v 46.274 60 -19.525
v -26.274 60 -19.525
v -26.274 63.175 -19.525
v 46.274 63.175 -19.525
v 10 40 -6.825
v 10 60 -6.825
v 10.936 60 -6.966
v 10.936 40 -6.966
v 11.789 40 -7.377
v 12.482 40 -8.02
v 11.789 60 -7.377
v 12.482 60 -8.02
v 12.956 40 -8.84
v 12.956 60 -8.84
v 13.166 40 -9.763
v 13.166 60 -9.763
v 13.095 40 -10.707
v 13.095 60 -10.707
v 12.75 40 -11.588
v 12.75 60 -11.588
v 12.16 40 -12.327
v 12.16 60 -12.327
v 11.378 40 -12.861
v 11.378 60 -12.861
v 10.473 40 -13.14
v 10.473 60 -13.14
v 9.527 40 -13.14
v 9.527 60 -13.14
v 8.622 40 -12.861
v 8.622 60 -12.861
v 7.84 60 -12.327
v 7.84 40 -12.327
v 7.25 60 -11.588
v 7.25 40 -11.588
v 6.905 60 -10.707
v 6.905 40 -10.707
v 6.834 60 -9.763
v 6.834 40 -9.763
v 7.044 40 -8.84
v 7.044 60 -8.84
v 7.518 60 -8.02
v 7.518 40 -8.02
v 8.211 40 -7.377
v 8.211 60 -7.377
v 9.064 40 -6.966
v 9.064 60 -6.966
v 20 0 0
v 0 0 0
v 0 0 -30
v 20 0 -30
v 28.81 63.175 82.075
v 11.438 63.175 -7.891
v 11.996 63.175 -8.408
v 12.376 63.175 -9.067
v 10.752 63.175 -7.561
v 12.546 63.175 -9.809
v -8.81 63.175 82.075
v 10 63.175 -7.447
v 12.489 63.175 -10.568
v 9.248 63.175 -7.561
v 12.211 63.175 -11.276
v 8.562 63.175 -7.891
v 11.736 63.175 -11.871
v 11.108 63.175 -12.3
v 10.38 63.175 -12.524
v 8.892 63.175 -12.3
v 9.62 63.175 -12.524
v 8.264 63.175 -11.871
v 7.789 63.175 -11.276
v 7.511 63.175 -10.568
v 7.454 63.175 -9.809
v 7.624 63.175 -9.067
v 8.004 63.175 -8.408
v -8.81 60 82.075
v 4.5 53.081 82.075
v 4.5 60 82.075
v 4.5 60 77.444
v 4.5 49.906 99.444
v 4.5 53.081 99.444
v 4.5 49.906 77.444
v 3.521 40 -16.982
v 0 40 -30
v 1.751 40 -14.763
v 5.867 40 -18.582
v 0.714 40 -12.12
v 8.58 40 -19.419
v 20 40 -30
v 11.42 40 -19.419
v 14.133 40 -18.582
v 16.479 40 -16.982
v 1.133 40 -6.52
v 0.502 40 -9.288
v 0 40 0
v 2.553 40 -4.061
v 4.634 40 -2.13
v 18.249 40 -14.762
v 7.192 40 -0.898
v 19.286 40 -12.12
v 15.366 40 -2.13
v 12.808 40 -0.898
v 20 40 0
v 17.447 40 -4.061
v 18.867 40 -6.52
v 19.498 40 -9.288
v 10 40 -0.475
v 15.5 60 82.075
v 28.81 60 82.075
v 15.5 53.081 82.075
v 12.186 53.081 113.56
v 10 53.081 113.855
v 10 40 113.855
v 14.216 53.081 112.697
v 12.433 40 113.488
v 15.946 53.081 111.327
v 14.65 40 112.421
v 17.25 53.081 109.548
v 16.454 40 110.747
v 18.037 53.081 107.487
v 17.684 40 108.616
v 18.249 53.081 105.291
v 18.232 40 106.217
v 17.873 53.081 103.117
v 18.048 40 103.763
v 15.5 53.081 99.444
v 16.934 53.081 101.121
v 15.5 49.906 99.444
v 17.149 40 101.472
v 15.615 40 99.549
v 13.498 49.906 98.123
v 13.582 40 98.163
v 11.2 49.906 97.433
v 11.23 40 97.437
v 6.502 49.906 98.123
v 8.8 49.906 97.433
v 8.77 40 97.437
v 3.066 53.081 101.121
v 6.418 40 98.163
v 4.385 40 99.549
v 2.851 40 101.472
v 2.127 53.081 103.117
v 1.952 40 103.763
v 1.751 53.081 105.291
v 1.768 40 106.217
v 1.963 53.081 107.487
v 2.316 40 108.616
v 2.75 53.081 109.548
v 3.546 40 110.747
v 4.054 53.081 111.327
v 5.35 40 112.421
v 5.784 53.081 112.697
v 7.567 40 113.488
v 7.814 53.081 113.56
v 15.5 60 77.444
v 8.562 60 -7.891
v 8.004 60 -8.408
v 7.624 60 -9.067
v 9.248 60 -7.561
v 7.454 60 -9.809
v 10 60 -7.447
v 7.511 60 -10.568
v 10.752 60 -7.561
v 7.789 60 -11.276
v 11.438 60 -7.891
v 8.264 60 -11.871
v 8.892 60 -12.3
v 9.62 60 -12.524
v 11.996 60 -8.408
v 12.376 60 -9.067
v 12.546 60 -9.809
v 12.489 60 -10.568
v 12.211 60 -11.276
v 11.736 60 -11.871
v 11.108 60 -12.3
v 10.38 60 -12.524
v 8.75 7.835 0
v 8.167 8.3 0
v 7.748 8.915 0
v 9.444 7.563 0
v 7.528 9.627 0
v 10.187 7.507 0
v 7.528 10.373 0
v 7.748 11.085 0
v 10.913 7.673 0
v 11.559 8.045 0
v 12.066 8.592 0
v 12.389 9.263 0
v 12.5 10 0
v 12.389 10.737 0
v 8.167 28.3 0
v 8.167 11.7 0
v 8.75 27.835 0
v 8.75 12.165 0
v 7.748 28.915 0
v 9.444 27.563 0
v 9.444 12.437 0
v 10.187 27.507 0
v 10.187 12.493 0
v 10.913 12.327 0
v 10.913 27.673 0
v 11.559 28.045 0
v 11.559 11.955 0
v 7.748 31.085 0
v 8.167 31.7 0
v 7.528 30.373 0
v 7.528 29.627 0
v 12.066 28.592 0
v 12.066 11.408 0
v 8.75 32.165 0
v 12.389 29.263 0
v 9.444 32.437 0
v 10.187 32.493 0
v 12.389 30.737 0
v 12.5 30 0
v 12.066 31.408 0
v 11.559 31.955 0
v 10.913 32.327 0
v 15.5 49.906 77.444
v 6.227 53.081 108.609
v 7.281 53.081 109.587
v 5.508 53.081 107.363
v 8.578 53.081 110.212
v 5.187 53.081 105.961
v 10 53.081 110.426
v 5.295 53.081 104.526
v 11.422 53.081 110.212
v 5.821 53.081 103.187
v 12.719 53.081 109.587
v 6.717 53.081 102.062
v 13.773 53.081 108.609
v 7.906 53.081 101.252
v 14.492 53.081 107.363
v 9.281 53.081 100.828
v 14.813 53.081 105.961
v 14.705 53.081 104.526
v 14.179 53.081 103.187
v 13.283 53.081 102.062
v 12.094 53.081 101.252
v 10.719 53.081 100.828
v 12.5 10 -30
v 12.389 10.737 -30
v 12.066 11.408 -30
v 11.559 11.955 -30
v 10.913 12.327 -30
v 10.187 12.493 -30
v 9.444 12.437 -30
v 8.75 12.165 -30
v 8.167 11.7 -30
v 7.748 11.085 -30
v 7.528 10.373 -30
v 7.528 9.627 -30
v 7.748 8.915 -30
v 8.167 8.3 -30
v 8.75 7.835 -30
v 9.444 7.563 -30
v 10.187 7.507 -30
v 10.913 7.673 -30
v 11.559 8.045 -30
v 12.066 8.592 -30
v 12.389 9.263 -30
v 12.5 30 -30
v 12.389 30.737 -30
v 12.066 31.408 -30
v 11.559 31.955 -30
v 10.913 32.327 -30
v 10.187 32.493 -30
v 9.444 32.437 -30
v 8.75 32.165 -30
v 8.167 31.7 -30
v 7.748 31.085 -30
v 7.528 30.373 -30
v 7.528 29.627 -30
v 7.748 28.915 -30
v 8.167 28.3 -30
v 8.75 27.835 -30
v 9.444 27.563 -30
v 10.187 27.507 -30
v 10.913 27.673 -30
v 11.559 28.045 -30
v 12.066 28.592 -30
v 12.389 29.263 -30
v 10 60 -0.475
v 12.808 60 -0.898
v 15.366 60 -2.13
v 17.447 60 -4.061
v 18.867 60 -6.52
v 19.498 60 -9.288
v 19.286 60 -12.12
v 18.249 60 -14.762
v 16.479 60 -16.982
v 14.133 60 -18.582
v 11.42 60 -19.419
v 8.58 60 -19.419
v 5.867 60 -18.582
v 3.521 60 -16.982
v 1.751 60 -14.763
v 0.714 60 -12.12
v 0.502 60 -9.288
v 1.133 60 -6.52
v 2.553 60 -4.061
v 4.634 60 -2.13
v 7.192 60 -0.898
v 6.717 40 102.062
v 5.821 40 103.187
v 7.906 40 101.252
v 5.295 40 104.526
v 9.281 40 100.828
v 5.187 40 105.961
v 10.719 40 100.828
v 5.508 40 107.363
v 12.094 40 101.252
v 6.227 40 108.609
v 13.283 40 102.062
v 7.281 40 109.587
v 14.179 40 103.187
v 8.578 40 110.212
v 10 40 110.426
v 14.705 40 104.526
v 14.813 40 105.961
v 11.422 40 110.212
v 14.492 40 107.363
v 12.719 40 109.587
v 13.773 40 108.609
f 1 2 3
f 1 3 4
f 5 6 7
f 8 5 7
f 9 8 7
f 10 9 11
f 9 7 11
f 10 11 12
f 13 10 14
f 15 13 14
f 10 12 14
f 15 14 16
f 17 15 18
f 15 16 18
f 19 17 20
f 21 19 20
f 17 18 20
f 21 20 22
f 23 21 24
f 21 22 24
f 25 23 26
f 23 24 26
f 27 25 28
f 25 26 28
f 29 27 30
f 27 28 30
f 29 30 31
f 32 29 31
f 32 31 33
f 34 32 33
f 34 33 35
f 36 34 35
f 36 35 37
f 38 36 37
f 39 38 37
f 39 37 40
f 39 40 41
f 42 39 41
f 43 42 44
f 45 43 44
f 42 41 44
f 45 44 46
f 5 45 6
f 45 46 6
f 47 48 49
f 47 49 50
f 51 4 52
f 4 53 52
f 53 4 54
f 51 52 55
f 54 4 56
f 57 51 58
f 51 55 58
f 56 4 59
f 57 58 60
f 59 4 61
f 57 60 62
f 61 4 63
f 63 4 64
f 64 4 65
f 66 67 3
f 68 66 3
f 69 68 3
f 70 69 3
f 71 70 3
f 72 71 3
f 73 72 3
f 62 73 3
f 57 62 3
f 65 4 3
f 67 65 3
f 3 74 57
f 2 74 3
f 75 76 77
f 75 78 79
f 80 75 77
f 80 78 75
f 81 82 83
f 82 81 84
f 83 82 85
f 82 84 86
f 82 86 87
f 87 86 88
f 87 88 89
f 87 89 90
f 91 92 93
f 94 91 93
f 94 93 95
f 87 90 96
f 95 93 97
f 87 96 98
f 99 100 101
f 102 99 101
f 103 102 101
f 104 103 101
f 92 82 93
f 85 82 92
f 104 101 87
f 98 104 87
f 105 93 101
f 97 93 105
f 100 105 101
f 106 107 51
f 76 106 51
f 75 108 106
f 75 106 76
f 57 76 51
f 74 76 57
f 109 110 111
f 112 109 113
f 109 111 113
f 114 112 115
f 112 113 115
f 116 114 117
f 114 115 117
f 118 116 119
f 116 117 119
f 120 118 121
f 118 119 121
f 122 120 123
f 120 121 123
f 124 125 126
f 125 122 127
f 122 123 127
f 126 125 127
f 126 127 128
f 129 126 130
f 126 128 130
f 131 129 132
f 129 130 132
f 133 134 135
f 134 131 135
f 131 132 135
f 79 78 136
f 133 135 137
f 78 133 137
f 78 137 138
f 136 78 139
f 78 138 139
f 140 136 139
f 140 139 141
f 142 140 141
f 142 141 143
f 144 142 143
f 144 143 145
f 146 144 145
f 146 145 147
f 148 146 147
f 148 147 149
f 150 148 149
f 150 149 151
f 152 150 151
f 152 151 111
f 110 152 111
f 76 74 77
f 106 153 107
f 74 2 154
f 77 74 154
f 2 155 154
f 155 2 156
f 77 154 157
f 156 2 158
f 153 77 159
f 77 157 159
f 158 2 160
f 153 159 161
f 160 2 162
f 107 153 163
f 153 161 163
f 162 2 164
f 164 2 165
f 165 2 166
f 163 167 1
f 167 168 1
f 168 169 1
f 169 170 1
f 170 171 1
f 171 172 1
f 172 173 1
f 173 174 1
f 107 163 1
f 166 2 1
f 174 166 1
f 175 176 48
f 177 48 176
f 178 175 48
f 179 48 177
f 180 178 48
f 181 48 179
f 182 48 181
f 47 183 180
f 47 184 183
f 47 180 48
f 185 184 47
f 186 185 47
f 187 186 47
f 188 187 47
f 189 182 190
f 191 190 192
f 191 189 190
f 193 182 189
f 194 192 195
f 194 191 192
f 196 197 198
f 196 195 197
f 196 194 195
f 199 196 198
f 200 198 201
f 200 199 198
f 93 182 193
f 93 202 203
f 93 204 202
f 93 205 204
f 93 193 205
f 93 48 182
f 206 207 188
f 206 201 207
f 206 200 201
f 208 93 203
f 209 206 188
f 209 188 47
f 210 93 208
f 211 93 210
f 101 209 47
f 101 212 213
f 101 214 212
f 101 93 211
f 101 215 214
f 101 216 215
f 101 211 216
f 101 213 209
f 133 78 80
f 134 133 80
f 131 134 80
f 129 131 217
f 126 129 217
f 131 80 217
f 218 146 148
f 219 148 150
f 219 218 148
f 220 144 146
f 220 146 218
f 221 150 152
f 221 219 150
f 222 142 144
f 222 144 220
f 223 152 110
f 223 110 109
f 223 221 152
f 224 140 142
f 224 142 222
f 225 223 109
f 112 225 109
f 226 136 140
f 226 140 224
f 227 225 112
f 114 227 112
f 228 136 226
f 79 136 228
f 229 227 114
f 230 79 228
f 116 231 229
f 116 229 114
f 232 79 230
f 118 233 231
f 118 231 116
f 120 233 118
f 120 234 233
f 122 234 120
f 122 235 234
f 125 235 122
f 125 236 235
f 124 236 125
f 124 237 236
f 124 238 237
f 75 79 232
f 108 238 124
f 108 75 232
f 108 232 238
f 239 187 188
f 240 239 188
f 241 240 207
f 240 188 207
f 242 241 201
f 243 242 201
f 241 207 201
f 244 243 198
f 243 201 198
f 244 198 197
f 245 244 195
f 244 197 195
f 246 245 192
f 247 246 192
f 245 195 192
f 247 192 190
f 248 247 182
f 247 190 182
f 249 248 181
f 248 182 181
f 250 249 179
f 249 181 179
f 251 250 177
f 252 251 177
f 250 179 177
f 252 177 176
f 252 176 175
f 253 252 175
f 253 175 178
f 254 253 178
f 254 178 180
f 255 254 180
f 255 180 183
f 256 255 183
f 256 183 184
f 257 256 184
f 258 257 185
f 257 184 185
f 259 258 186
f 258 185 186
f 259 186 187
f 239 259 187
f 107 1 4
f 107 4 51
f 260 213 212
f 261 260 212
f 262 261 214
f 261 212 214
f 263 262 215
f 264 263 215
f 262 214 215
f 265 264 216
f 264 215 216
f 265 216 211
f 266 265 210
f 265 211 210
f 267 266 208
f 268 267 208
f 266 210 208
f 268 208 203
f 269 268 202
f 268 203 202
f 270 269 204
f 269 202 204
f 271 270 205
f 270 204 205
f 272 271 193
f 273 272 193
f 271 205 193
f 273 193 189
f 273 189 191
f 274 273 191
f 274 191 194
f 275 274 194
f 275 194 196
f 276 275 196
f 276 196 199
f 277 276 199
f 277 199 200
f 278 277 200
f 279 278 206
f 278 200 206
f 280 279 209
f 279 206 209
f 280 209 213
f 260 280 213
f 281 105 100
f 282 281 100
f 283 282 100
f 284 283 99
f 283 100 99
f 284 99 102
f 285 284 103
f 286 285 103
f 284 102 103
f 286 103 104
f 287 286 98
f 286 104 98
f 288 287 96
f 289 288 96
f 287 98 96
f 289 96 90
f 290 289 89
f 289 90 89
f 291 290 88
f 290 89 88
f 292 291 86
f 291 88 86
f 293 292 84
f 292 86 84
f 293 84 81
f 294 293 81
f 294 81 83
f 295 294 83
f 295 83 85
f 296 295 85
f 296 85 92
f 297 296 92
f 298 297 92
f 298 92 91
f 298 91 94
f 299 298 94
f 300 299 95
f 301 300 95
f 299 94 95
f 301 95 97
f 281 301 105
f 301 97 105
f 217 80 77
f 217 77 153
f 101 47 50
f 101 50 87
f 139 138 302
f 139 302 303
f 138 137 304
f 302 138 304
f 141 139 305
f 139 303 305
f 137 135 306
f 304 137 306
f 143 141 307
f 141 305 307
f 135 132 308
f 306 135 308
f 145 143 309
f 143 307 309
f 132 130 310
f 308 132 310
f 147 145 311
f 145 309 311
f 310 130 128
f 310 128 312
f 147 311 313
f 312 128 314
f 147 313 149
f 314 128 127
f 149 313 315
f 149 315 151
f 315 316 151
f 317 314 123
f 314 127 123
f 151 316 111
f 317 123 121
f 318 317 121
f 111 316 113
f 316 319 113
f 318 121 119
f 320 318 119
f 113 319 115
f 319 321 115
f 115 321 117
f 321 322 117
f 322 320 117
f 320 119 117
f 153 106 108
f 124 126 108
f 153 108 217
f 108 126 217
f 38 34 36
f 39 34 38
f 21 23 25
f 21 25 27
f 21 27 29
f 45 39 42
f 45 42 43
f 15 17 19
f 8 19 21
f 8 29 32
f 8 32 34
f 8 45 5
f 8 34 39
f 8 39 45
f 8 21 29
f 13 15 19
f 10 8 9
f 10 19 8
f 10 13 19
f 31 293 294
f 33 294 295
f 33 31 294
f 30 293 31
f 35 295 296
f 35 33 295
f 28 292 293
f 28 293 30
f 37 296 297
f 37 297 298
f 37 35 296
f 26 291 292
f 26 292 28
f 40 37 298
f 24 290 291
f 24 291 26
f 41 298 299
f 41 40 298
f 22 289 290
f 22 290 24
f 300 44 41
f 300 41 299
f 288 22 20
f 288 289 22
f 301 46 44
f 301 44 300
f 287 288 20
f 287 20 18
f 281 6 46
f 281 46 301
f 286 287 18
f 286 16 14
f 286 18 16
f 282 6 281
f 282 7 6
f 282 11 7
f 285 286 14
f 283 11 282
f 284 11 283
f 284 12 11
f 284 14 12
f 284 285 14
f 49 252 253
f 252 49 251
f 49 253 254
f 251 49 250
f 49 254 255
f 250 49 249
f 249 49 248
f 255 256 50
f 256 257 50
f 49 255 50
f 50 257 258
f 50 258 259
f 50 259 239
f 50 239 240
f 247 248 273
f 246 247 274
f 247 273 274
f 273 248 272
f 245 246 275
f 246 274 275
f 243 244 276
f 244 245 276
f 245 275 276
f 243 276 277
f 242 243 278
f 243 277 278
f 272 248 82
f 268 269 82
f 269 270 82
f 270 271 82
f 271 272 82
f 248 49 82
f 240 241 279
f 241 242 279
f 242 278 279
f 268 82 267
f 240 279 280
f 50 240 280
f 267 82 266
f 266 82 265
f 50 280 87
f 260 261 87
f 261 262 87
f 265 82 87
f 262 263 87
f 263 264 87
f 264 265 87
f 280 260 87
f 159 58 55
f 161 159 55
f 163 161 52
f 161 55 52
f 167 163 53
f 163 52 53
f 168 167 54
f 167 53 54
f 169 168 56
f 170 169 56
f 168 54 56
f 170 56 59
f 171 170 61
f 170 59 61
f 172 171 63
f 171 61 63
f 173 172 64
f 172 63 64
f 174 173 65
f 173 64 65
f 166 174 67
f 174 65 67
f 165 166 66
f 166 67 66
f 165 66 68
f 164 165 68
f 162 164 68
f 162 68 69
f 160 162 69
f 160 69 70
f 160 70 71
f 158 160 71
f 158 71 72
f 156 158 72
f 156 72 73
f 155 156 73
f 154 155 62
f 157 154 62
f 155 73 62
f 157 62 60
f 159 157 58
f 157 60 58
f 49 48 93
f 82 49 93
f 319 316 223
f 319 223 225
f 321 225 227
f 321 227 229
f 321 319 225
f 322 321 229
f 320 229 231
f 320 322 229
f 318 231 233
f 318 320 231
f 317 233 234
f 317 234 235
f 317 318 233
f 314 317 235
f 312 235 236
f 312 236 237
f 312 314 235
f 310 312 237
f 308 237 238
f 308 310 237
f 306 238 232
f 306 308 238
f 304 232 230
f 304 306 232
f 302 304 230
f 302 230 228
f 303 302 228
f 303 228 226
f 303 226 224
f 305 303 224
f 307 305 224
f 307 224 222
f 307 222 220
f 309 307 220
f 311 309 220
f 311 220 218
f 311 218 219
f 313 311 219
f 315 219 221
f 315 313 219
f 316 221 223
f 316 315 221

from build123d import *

# Parameters (mm, degrees)
SKETCH1_W           = 20
SKETCH1_H           = 40
SKETCH1_R           = 2.5
BOSS_EXTRUDE1_DEPTH = 30
SKETCH3_R           = 9.525
BOSS_EXTRUDE2_DEPTH = 20
SKETCH5_R           = 3.175
CUT_EXTRUDE1_DEPTH  = 20
SKETCH4_R           = 4.826
BOSS_EXTRUDE3_DEPTH = 3.175
SKETCH7_R           = 8.255
SKETCH7_R_2         = 4.826
BOSS_EXTRUDE5_DEPTH = 13.081
SKETCH9_W           = 11
SKETCH9_H           = 22
BOSS_EXTRUDE6_DEPTH = 3.175
SKETCH10_W          = 11
SKETCH10_H          = 4.630893518
BOSS_EXTRUDE7_DEPTH = 6.919
SKETCH13_R          = 2.5527
CUT_EXTRUDE5_DEPTH  = 3.175


with BuildPart() as part:
    # Sketch1 → Boss-Extrude1 (new body)
    with BuildSketch(Plane.XY):
        with Locations((10, 20)):
            Rectangle(SKETCH1_W, SKETCH1_H)
        with Locations((10, 30)):
            Circle(SKETCH1_R, mode=Mode.SUBTRACT)
        with Locations((10, 10)):
            Circle(SKETCH1_R, mode=Mode.SUBTRACT)
    extrude(amount=-BOSS_EXTRUDE1_DEPTH)

    # Sketch3 → Boss-Extrude2 (add)
    with BuildSketch(Plane(origin=(0, 40, 0), x_dir=(1, 0, 0), z_dir=(0, 1, 0))):
        with Locations(Location((10, 10, 0), (0, 0, 270))):
            Circle(SKETCH3_R)
    extrude(amount=BOSS_EXTRUDE2_DEPTH)

    # Sketch5 → Cut-Extrude1 (cut)
    with BuildSketch(Plane(origin=(0, 60, 0), x_dir=(1, 0, 0), z_dir=(0, 1, 0))):
        with Locations(Location((10, 10, 0), (0, 0, 270))):
            Circle(SKETCH5_R)
    extrude(amount=-CUT_EXTRUDE1_DEPTH, mode=Mode.SUBTRACT)


with BuildPart() as body_2:
    # Sketch4 → Boss-Extrude3 (new body)
    # profile 1 of 2: a face of its own
    with BuildSketch(Plane(origin=(0, 60, 0), x_dir=(1, 0, 0), z_dir=(0, 1, 0))):
        Polygon((46.273751225, 19.525), (28.810402961, -82.075), (-8.810402961, -82.075), (-26.273751225, 19.525), align=None)
        with Locations((10, -73.185)):
            Circle(SKETCH4_R, mode=Mode.SUBTRACT)
    # profile 2 of 2: a face of its own
    with BuildSketch(Plane(origin=(0, 60, 0), x_dir=(1, 0, 0), z_dir=(0, 1, 0))):
        with Locations((10, -73.185)):
            Circle(SKETCH4_R)
    extrude(amount=BOSS_EXTRUDE3_DEPTH)


with BuildPart() as body_3:
    # Sketch7 → Boss-Extrude5 (new body)
    with BuildSketch(Plane(origin=(0, 40, 0), x_dir=(1, 0, 0), z_dir=(0, 1, 0))):
        with Locations(Location((10, -105.6, 0), (0, 0, 270))):
            Circle(SKETCH7_R)
        with Locations(Location((10, -105.6, 0), (0, 0, 270))):
            Circle(SKETCH7_R_2, mode=Mode.SUBTRACT)
    extrude(amount=BOSS_EXTRUDE5_DEPTH)

    # Sketch9 → Boss-Extrude6 (add)
    with BuildSketch(Plane(origin=(0, 53.081, 0), x_dir=(1, 0, 0), z_dir=(0, 1, 0))):
        with Locations((10, -88.444106482)):
            Rectangle(SKETCH9_W, SKETCH9_H)
    extrude(amount=-BOSS_EXTRUDE6_DEPTH)

    # Sketch10 → Boss-Extrude7 (add)
    with BuildSketch(Plane(origin=(0, 53.081, 0), x_dir=(1, 0, 0), z_dir=(0, 1, 0))):
        with Locations((10, -79.759553241)):
            Rectangle(SKETCH10_W, SKETCH10_H)
    extrude(amount=BOSS_EXTRUDE7_DEPTH)

    # Combine1: union body 2
    add(body_2.part)

    # Sketch13 → Cut-Extrude5 (cut)
    with BuildSketch(Plane(origin=(0, 63.175, 0), x_dir=(1, 0, 0), z_dir=(0, 1, 0))):
        with Locations(Location((10, 10, 0), (0, 0, 270))):
            Circle(SKETCH13_R)
    extrude(amount=-CUT_EXTRUDE5_DEPTH, mode=Mode.SUBTRACT)


solid = Compound([part.part, body_3.part])
